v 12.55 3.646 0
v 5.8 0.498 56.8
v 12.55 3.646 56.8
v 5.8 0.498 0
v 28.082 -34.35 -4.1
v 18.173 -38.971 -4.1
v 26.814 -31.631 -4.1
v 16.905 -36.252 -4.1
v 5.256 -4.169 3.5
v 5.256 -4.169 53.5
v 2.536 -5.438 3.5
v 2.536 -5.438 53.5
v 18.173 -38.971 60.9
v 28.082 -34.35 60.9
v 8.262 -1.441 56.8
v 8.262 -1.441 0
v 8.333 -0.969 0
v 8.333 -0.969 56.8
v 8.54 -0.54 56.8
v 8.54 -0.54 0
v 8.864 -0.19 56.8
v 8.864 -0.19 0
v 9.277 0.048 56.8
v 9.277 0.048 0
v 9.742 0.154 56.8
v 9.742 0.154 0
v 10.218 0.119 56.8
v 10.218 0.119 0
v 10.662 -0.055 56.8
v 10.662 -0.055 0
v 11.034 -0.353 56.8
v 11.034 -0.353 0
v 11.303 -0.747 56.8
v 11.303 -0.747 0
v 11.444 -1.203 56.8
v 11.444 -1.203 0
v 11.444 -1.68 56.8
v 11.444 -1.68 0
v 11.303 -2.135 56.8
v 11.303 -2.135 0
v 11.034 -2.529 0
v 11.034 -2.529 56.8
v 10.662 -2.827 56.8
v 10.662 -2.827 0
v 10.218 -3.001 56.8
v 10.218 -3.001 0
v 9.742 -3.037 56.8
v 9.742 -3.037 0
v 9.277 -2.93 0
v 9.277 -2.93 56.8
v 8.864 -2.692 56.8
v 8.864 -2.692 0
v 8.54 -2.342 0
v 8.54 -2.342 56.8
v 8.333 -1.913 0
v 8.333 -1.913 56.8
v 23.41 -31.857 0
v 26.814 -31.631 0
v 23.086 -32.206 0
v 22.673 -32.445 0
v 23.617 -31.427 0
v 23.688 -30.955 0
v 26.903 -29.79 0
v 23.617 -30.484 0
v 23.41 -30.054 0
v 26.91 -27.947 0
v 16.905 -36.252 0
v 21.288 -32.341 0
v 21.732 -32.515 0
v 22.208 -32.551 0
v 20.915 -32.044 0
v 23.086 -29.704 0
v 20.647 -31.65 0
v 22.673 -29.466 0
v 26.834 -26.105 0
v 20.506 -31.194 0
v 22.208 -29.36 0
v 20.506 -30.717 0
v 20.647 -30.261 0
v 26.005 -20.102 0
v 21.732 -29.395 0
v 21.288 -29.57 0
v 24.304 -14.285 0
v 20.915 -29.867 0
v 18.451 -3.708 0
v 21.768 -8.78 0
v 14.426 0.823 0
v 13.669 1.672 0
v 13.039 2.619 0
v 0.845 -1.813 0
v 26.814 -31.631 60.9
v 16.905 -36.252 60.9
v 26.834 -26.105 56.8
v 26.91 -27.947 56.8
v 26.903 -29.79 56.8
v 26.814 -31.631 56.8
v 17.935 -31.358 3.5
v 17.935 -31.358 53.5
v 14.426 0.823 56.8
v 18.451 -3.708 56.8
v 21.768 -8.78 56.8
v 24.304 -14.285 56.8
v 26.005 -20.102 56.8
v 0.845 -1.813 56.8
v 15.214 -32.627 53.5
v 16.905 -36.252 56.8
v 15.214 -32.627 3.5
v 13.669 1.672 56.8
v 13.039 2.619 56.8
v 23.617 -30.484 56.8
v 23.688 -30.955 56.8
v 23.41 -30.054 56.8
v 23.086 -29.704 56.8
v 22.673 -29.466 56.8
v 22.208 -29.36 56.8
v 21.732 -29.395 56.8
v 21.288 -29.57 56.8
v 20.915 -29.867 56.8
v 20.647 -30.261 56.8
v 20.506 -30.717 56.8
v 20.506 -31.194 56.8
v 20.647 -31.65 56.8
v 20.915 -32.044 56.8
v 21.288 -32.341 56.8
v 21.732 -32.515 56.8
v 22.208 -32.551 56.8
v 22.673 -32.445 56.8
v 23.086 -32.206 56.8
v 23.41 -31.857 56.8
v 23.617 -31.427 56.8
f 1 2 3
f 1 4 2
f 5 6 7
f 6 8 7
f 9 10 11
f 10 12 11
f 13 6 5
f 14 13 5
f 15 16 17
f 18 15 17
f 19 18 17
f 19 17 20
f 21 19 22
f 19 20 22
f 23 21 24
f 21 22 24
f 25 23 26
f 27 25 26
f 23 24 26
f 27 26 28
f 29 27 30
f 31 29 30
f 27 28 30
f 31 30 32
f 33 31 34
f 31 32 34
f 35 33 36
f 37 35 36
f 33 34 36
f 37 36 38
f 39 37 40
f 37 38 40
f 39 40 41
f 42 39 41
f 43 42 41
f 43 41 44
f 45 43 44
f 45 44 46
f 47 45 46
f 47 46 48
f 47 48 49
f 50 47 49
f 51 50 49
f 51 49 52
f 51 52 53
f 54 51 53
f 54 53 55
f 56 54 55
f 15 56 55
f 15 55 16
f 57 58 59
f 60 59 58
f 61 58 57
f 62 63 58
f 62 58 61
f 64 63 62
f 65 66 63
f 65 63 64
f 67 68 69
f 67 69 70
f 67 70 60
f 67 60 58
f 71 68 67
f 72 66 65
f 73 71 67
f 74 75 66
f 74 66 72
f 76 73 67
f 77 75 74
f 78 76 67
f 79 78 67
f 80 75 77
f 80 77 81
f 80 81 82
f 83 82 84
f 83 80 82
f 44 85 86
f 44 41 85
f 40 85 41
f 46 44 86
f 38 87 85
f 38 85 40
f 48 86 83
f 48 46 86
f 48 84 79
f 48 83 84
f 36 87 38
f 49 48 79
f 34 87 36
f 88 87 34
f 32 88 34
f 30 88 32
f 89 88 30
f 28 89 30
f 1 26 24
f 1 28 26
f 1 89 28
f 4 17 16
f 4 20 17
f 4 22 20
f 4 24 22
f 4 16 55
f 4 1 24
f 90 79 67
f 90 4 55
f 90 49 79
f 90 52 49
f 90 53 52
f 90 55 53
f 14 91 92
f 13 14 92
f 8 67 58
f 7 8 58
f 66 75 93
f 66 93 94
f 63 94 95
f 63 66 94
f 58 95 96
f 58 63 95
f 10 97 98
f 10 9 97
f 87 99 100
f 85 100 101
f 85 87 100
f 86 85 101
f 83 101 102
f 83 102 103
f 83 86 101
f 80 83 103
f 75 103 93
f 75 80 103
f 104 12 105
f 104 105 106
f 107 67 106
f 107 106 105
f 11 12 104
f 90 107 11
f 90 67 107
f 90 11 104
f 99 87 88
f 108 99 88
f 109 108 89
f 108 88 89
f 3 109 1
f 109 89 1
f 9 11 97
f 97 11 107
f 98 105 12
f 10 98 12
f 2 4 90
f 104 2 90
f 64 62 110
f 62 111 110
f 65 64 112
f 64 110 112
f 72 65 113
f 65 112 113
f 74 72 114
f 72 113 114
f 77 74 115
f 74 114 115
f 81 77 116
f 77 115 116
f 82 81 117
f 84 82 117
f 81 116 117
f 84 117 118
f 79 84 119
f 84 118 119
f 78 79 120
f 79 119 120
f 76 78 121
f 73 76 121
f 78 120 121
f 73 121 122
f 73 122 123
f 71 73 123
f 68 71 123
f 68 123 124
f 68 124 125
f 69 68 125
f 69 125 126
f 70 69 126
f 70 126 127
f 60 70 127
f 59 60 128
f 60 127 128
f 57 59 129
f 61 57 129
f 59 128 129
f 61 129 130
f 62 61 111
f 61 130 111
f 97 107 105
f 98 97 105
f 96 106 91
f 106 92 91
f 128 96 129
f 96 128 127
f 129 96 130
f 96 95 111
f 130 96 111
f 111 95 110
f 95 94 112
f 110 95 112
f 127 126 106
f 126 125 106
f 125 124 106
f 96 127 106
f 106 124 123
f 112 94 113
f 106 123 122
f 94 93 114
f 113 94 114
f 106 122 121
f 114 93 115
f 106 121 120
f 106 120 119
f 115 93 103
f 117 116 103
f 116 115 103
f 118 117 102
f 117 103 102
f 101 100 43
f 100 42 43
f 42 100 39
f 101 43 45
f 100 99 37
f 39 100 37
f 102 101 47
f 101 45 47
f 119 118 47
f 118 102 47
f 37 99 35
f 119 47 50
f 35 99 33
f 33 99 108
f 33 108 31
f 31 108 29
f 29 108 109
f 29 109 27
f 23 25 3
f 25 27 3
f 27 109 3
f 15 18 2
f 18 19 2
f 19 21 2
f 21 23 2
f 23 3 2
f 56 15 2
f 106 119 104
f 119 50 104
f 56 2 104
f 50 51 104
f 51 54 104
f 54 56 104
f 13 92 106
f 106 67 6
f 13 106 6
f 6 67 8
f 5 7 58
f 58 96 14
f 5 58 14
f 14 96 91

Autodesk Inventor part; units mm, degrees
ref_plane "YZ Plane" through (0, 0, 0) normal (1, 0, 0) x (0, 1, 0)
ref_plane "XZ Plane" through (0, 0, 0) normal (0, 1, 0) x (-1, 0, 0)
ref_plane "XY Plane" through (0, 0, 0) normal (0, 0, 1) x (1, 0, 0)
sketch "스케치1" plane through (0, 0, 0) normal (0, 0, 1) x (1, 0, 0)
  line L0 (16.9047, -36.2523) -> (26.8143, -31.6314)
  arc A0 (17.3077, -34.3271) -> (17.3407, -34.809) centre (18.2923, -34.5019) ccw
  line L1 (20, -34.809) -> (17.8869, -30.2774)
  line L2 (20, -34.809) -> (25, -34.809) construction
  line L3 (17.8869, -30.2774) -> (26.834, -26.1053)
  arc A1 (26.8143, -31.6314) -> (26.834, -26.1053) centre (-14.2701, -28.7218) ccw
  line L4 (26.834, -26.1053) -> (17.7607, -30.3363)
  arc A2 (16.9047, -36.2523) -> (17.7607, -30.3363) centre (-14.2701, -28.7218) ccw
  line L5 (26.834, -26.1053) -> (16.9047, -36.2523)
  line L6 (17.9253, -30.3598) -> (26.8143, -31.6314)
  circle A3 centre (22.0881, -30.9553) radius 1.6
  point P0 (0, 0)
  point P1 (12.3536, 2.7038)
  point P2 (0.5383, -0.2738)
  dimension "d0" = 5
  dimension "d1" = 115
  dimension "d2" = 90
  dimension "d3" = 3.2
extrude "돌출1" add sketch "스케치1" along normal blind 56.8
sketch "스케치2" plane through (0, 0, 56.8) normal (0, 0, 1) x (1, 0, 0)
  line L0 (16.9047, -36.2523) -> (26.8143, -31.6314)
  arc A0 (17.3077, -34.3271) -> (18.715, -35.4082) centre (18.2923, -34.5019) ccw
  arc A1 (26.2765, -31.8822) -> (26.8523, -31.032) centre (25.8539, -30.9759) ccw
  line L1 (20, -34.809) -> (17.8869, -30.2774)
  line L2 (20, -34.809) -> (25, -34.809) construction
  line L3 (17.8869, -30.2774) -> (26.834, -26.1053)
  arc A2 (26.8143, -31.6314) -> (12, 3) centre (-14.2701, -28.7218) ccw
  line L4 (26.834, -26.1053) -> (17.7607, -30.3363)
  arc A3 (16.9047, -36.2523) -> (0, 0) centre (-14.2701, -28.7218) ccw
  arc A4 (26.2765, -31.8822) -> (26.8523, -31.032) centre (25.8539, -30.9759) ccw
  circle A5 centre (22.0881, -30.9553) radius 1.6
  line L5 (26.834, -26.1053) -> (22.0881, -30.9553)
  line L6 (19.4569, -33.6442) -> (16.9047, -36.2523)
  line L7 (17.7607, -30.3363) -> (20.5042, -30.7287)
  line L8 (23.6719, -31.1819) -> (26.8143, -31.6314)
  point P0 (12.3536, 2.7038)
  point P1 (0.5383, -0.2738)
  dimension "d6" = 5
  dimension "d7" = 115
  dimension "d8" = 90
  dimension "d9" = 3.2
extrude "돌출2" cut sketch "스케치2" against normal up to surface (56.8 mm away) contours A5
sketch "스케치3" plane through (26.8143, -31.6314, 0) normal (0.4226183, -0.9063078, 0) x (0.9063078, 0.4226183, 0)
  line L0 (-10.934, -4.1) -> (0, -4.1)
  line L1 (0, -4.1) -> (0, 60.9)
  line L2 (0, 60.9) -> (-10.934, 60.9)
  line L3 (-10.934, 60.9) -> (-10.934, -4.1)
  line L4 (0, 0) -> (0, 56.8) projected
  line L5 (-10.934, 0) -> (-10.934, 56.8) projected
  dimension "d12" = 65
  dimension "d13" = 4.1
  dimension "d14" = 10.934
  dimension "d15" = 10.934
  dimension "d16" = 10.934
extrude "돌출3" add sketch "스케치3" along normal blind 3
sketch "스케치4" plane through (0, 0, 0) normal (0, 0, -1) x (-1, 0, 0)
  circle A0 centre (-6, 44) radius 4.8
  circle A1 centre (-6, 9) radius 4.8
  circle A2 centre (-9.8616, -1.4411) radius 1.6
  circle A3 centre (-22.0881, -30.9553) radius 1.6
  arc A4 (0, 44) -> (-12, 44) centre (-6, 44) ccw
  line L0 (-12, 6.562) -> (-12, 44)
  arc A5 (-14.4262, 0.8233) -> (-12, 6.562) centre (-20, 6.562) ccw
  arc A6 (-14.4262, 0.8233) -> (-26.8143, -31.6314) centre (14.2701, -28.7218) ccw
  line L1 (-16.9047, -36.2523) -> (-26.8143, -31.6314)
  line L2 (-16.9047, -36.2523) -> (0, 0)
  line L3 (0, 44) -> (0, 0)
  line L4 (-16.9047, -36.2523) -> (-26.8143, -31.6314) projected
  line L5 (-26.8143, -31.6314) -> (-28.0821, -34.3503) projected
  line L6 (-18.1726, -38.9712) -> (-28.0821, -34.3503) projected
  line L7 (-16.9047, -36.2523) -> (-18.1726, -38.9712) projected
  circle A7 centre (-22.0881, -30.9553) radius 1.6 projected
  line L8 (-16.9047, -36.2523) -> (-26.8143, -31.6314) projected
  arc A8 (-17.7607, -30.3363) -> (-16.9047, -36.2523) centre (14.2701, -28.7218) ccw projected
  line L9 (-26.834, -26.1053) -> (-17.7607, -30.3363) projected
  arc A9 (-26.834, -26.1053) -> (-26.8143, -31.6314) centre (14.2701, -28.7218) ccw projected
  line L10 (-16.9047, -36.2523) -> (-26.8143, -31.6314) projected
  line L11 (-21.8595, -33.9419) -> (-5.8, 0.4978) construction
  line L12 (-5.8, 0.4978) -> (-0.8452, -1.8126)
  line L13 (-5.8, 0.4978) -> (-12.5505, 3.6456)
  point P0 (0, 0)
  point P1 (0, 0)
  point P2 (-17.7151, -2.7731)
  dimension "d19" = 38
extrude "돌출4" add sketch "스케치4" against normal up to surface (56.8 mm away) contours L2 A8 L9 A6 A5 L13 L12
sketch "스케치8" plane through (16.9047, -36.2523, -4.1) normal (-0.9063078, -0.4226183, 0) x (0, 0, 1)
  line L0 (4.1, 38) -> (60.9, 38) projected
  line L1 (4.1, 0) -> (4.1, 38) projected
  line L2 (65, 0) -> (60.9, 0) projected
  line L3 (0, 0) -> (0, -3) projected
  line L4 (65, -3) -> (0, -3) projected
  line L5 (65, 0) -> (65, -3) projected
  line L6 (4.1, 0) -> (0, 0) projected
  line L7 (60.9, 0) -> (60.9, 38) projected
  line L8 (4.1, 0) -> (4.1, 34.6494) projected
  line L9 (61.1, 38) -> (4.1, 38)
  line L10 (4.1, 38) -> (4.1, 0)
  line L11 (4.1, 0) -> (61.1, 0)
  line L12 (61.1, 0) -> (61.1, 38)
  line L13 (4.1, 38) -> (61.1, 38) projected
  line L14 (32.6, 38) -> (32.6, 19)
  line L15 (60.9, 0) -> (60.9, 38) projected
  line L16 (60.9, 19.0005) -> (4.1, 19)
  line L17 (57.6, 34) -> (7.6, 34)
  line L18 (7.6, 34) -> (7.6, 4)
  line L19 (7.6, 4) -> (57.6, 4)
  line L20 (57.6, 4) -> (57.6, 34)
  line L21 (57.6, 34) -> (7.6, 4) construction
  line L22 (7.6, 34) -> (57.6, 4) construction
  point P0 (4.1, 40)
  dimension "d37" = 50
  dimension "d38" = 30
extrude "돌출7" cut sketch "스케치8" against normal blind 3 contours L17 L20 L16 L14 | L14 L16 L18 L17 | L16 L20 L19 L18
equation "\"d15\" = d14"
equation "\"d16\" = d14"
properties part number "Grip_Side_Down" material "LCP 플라스틱"
